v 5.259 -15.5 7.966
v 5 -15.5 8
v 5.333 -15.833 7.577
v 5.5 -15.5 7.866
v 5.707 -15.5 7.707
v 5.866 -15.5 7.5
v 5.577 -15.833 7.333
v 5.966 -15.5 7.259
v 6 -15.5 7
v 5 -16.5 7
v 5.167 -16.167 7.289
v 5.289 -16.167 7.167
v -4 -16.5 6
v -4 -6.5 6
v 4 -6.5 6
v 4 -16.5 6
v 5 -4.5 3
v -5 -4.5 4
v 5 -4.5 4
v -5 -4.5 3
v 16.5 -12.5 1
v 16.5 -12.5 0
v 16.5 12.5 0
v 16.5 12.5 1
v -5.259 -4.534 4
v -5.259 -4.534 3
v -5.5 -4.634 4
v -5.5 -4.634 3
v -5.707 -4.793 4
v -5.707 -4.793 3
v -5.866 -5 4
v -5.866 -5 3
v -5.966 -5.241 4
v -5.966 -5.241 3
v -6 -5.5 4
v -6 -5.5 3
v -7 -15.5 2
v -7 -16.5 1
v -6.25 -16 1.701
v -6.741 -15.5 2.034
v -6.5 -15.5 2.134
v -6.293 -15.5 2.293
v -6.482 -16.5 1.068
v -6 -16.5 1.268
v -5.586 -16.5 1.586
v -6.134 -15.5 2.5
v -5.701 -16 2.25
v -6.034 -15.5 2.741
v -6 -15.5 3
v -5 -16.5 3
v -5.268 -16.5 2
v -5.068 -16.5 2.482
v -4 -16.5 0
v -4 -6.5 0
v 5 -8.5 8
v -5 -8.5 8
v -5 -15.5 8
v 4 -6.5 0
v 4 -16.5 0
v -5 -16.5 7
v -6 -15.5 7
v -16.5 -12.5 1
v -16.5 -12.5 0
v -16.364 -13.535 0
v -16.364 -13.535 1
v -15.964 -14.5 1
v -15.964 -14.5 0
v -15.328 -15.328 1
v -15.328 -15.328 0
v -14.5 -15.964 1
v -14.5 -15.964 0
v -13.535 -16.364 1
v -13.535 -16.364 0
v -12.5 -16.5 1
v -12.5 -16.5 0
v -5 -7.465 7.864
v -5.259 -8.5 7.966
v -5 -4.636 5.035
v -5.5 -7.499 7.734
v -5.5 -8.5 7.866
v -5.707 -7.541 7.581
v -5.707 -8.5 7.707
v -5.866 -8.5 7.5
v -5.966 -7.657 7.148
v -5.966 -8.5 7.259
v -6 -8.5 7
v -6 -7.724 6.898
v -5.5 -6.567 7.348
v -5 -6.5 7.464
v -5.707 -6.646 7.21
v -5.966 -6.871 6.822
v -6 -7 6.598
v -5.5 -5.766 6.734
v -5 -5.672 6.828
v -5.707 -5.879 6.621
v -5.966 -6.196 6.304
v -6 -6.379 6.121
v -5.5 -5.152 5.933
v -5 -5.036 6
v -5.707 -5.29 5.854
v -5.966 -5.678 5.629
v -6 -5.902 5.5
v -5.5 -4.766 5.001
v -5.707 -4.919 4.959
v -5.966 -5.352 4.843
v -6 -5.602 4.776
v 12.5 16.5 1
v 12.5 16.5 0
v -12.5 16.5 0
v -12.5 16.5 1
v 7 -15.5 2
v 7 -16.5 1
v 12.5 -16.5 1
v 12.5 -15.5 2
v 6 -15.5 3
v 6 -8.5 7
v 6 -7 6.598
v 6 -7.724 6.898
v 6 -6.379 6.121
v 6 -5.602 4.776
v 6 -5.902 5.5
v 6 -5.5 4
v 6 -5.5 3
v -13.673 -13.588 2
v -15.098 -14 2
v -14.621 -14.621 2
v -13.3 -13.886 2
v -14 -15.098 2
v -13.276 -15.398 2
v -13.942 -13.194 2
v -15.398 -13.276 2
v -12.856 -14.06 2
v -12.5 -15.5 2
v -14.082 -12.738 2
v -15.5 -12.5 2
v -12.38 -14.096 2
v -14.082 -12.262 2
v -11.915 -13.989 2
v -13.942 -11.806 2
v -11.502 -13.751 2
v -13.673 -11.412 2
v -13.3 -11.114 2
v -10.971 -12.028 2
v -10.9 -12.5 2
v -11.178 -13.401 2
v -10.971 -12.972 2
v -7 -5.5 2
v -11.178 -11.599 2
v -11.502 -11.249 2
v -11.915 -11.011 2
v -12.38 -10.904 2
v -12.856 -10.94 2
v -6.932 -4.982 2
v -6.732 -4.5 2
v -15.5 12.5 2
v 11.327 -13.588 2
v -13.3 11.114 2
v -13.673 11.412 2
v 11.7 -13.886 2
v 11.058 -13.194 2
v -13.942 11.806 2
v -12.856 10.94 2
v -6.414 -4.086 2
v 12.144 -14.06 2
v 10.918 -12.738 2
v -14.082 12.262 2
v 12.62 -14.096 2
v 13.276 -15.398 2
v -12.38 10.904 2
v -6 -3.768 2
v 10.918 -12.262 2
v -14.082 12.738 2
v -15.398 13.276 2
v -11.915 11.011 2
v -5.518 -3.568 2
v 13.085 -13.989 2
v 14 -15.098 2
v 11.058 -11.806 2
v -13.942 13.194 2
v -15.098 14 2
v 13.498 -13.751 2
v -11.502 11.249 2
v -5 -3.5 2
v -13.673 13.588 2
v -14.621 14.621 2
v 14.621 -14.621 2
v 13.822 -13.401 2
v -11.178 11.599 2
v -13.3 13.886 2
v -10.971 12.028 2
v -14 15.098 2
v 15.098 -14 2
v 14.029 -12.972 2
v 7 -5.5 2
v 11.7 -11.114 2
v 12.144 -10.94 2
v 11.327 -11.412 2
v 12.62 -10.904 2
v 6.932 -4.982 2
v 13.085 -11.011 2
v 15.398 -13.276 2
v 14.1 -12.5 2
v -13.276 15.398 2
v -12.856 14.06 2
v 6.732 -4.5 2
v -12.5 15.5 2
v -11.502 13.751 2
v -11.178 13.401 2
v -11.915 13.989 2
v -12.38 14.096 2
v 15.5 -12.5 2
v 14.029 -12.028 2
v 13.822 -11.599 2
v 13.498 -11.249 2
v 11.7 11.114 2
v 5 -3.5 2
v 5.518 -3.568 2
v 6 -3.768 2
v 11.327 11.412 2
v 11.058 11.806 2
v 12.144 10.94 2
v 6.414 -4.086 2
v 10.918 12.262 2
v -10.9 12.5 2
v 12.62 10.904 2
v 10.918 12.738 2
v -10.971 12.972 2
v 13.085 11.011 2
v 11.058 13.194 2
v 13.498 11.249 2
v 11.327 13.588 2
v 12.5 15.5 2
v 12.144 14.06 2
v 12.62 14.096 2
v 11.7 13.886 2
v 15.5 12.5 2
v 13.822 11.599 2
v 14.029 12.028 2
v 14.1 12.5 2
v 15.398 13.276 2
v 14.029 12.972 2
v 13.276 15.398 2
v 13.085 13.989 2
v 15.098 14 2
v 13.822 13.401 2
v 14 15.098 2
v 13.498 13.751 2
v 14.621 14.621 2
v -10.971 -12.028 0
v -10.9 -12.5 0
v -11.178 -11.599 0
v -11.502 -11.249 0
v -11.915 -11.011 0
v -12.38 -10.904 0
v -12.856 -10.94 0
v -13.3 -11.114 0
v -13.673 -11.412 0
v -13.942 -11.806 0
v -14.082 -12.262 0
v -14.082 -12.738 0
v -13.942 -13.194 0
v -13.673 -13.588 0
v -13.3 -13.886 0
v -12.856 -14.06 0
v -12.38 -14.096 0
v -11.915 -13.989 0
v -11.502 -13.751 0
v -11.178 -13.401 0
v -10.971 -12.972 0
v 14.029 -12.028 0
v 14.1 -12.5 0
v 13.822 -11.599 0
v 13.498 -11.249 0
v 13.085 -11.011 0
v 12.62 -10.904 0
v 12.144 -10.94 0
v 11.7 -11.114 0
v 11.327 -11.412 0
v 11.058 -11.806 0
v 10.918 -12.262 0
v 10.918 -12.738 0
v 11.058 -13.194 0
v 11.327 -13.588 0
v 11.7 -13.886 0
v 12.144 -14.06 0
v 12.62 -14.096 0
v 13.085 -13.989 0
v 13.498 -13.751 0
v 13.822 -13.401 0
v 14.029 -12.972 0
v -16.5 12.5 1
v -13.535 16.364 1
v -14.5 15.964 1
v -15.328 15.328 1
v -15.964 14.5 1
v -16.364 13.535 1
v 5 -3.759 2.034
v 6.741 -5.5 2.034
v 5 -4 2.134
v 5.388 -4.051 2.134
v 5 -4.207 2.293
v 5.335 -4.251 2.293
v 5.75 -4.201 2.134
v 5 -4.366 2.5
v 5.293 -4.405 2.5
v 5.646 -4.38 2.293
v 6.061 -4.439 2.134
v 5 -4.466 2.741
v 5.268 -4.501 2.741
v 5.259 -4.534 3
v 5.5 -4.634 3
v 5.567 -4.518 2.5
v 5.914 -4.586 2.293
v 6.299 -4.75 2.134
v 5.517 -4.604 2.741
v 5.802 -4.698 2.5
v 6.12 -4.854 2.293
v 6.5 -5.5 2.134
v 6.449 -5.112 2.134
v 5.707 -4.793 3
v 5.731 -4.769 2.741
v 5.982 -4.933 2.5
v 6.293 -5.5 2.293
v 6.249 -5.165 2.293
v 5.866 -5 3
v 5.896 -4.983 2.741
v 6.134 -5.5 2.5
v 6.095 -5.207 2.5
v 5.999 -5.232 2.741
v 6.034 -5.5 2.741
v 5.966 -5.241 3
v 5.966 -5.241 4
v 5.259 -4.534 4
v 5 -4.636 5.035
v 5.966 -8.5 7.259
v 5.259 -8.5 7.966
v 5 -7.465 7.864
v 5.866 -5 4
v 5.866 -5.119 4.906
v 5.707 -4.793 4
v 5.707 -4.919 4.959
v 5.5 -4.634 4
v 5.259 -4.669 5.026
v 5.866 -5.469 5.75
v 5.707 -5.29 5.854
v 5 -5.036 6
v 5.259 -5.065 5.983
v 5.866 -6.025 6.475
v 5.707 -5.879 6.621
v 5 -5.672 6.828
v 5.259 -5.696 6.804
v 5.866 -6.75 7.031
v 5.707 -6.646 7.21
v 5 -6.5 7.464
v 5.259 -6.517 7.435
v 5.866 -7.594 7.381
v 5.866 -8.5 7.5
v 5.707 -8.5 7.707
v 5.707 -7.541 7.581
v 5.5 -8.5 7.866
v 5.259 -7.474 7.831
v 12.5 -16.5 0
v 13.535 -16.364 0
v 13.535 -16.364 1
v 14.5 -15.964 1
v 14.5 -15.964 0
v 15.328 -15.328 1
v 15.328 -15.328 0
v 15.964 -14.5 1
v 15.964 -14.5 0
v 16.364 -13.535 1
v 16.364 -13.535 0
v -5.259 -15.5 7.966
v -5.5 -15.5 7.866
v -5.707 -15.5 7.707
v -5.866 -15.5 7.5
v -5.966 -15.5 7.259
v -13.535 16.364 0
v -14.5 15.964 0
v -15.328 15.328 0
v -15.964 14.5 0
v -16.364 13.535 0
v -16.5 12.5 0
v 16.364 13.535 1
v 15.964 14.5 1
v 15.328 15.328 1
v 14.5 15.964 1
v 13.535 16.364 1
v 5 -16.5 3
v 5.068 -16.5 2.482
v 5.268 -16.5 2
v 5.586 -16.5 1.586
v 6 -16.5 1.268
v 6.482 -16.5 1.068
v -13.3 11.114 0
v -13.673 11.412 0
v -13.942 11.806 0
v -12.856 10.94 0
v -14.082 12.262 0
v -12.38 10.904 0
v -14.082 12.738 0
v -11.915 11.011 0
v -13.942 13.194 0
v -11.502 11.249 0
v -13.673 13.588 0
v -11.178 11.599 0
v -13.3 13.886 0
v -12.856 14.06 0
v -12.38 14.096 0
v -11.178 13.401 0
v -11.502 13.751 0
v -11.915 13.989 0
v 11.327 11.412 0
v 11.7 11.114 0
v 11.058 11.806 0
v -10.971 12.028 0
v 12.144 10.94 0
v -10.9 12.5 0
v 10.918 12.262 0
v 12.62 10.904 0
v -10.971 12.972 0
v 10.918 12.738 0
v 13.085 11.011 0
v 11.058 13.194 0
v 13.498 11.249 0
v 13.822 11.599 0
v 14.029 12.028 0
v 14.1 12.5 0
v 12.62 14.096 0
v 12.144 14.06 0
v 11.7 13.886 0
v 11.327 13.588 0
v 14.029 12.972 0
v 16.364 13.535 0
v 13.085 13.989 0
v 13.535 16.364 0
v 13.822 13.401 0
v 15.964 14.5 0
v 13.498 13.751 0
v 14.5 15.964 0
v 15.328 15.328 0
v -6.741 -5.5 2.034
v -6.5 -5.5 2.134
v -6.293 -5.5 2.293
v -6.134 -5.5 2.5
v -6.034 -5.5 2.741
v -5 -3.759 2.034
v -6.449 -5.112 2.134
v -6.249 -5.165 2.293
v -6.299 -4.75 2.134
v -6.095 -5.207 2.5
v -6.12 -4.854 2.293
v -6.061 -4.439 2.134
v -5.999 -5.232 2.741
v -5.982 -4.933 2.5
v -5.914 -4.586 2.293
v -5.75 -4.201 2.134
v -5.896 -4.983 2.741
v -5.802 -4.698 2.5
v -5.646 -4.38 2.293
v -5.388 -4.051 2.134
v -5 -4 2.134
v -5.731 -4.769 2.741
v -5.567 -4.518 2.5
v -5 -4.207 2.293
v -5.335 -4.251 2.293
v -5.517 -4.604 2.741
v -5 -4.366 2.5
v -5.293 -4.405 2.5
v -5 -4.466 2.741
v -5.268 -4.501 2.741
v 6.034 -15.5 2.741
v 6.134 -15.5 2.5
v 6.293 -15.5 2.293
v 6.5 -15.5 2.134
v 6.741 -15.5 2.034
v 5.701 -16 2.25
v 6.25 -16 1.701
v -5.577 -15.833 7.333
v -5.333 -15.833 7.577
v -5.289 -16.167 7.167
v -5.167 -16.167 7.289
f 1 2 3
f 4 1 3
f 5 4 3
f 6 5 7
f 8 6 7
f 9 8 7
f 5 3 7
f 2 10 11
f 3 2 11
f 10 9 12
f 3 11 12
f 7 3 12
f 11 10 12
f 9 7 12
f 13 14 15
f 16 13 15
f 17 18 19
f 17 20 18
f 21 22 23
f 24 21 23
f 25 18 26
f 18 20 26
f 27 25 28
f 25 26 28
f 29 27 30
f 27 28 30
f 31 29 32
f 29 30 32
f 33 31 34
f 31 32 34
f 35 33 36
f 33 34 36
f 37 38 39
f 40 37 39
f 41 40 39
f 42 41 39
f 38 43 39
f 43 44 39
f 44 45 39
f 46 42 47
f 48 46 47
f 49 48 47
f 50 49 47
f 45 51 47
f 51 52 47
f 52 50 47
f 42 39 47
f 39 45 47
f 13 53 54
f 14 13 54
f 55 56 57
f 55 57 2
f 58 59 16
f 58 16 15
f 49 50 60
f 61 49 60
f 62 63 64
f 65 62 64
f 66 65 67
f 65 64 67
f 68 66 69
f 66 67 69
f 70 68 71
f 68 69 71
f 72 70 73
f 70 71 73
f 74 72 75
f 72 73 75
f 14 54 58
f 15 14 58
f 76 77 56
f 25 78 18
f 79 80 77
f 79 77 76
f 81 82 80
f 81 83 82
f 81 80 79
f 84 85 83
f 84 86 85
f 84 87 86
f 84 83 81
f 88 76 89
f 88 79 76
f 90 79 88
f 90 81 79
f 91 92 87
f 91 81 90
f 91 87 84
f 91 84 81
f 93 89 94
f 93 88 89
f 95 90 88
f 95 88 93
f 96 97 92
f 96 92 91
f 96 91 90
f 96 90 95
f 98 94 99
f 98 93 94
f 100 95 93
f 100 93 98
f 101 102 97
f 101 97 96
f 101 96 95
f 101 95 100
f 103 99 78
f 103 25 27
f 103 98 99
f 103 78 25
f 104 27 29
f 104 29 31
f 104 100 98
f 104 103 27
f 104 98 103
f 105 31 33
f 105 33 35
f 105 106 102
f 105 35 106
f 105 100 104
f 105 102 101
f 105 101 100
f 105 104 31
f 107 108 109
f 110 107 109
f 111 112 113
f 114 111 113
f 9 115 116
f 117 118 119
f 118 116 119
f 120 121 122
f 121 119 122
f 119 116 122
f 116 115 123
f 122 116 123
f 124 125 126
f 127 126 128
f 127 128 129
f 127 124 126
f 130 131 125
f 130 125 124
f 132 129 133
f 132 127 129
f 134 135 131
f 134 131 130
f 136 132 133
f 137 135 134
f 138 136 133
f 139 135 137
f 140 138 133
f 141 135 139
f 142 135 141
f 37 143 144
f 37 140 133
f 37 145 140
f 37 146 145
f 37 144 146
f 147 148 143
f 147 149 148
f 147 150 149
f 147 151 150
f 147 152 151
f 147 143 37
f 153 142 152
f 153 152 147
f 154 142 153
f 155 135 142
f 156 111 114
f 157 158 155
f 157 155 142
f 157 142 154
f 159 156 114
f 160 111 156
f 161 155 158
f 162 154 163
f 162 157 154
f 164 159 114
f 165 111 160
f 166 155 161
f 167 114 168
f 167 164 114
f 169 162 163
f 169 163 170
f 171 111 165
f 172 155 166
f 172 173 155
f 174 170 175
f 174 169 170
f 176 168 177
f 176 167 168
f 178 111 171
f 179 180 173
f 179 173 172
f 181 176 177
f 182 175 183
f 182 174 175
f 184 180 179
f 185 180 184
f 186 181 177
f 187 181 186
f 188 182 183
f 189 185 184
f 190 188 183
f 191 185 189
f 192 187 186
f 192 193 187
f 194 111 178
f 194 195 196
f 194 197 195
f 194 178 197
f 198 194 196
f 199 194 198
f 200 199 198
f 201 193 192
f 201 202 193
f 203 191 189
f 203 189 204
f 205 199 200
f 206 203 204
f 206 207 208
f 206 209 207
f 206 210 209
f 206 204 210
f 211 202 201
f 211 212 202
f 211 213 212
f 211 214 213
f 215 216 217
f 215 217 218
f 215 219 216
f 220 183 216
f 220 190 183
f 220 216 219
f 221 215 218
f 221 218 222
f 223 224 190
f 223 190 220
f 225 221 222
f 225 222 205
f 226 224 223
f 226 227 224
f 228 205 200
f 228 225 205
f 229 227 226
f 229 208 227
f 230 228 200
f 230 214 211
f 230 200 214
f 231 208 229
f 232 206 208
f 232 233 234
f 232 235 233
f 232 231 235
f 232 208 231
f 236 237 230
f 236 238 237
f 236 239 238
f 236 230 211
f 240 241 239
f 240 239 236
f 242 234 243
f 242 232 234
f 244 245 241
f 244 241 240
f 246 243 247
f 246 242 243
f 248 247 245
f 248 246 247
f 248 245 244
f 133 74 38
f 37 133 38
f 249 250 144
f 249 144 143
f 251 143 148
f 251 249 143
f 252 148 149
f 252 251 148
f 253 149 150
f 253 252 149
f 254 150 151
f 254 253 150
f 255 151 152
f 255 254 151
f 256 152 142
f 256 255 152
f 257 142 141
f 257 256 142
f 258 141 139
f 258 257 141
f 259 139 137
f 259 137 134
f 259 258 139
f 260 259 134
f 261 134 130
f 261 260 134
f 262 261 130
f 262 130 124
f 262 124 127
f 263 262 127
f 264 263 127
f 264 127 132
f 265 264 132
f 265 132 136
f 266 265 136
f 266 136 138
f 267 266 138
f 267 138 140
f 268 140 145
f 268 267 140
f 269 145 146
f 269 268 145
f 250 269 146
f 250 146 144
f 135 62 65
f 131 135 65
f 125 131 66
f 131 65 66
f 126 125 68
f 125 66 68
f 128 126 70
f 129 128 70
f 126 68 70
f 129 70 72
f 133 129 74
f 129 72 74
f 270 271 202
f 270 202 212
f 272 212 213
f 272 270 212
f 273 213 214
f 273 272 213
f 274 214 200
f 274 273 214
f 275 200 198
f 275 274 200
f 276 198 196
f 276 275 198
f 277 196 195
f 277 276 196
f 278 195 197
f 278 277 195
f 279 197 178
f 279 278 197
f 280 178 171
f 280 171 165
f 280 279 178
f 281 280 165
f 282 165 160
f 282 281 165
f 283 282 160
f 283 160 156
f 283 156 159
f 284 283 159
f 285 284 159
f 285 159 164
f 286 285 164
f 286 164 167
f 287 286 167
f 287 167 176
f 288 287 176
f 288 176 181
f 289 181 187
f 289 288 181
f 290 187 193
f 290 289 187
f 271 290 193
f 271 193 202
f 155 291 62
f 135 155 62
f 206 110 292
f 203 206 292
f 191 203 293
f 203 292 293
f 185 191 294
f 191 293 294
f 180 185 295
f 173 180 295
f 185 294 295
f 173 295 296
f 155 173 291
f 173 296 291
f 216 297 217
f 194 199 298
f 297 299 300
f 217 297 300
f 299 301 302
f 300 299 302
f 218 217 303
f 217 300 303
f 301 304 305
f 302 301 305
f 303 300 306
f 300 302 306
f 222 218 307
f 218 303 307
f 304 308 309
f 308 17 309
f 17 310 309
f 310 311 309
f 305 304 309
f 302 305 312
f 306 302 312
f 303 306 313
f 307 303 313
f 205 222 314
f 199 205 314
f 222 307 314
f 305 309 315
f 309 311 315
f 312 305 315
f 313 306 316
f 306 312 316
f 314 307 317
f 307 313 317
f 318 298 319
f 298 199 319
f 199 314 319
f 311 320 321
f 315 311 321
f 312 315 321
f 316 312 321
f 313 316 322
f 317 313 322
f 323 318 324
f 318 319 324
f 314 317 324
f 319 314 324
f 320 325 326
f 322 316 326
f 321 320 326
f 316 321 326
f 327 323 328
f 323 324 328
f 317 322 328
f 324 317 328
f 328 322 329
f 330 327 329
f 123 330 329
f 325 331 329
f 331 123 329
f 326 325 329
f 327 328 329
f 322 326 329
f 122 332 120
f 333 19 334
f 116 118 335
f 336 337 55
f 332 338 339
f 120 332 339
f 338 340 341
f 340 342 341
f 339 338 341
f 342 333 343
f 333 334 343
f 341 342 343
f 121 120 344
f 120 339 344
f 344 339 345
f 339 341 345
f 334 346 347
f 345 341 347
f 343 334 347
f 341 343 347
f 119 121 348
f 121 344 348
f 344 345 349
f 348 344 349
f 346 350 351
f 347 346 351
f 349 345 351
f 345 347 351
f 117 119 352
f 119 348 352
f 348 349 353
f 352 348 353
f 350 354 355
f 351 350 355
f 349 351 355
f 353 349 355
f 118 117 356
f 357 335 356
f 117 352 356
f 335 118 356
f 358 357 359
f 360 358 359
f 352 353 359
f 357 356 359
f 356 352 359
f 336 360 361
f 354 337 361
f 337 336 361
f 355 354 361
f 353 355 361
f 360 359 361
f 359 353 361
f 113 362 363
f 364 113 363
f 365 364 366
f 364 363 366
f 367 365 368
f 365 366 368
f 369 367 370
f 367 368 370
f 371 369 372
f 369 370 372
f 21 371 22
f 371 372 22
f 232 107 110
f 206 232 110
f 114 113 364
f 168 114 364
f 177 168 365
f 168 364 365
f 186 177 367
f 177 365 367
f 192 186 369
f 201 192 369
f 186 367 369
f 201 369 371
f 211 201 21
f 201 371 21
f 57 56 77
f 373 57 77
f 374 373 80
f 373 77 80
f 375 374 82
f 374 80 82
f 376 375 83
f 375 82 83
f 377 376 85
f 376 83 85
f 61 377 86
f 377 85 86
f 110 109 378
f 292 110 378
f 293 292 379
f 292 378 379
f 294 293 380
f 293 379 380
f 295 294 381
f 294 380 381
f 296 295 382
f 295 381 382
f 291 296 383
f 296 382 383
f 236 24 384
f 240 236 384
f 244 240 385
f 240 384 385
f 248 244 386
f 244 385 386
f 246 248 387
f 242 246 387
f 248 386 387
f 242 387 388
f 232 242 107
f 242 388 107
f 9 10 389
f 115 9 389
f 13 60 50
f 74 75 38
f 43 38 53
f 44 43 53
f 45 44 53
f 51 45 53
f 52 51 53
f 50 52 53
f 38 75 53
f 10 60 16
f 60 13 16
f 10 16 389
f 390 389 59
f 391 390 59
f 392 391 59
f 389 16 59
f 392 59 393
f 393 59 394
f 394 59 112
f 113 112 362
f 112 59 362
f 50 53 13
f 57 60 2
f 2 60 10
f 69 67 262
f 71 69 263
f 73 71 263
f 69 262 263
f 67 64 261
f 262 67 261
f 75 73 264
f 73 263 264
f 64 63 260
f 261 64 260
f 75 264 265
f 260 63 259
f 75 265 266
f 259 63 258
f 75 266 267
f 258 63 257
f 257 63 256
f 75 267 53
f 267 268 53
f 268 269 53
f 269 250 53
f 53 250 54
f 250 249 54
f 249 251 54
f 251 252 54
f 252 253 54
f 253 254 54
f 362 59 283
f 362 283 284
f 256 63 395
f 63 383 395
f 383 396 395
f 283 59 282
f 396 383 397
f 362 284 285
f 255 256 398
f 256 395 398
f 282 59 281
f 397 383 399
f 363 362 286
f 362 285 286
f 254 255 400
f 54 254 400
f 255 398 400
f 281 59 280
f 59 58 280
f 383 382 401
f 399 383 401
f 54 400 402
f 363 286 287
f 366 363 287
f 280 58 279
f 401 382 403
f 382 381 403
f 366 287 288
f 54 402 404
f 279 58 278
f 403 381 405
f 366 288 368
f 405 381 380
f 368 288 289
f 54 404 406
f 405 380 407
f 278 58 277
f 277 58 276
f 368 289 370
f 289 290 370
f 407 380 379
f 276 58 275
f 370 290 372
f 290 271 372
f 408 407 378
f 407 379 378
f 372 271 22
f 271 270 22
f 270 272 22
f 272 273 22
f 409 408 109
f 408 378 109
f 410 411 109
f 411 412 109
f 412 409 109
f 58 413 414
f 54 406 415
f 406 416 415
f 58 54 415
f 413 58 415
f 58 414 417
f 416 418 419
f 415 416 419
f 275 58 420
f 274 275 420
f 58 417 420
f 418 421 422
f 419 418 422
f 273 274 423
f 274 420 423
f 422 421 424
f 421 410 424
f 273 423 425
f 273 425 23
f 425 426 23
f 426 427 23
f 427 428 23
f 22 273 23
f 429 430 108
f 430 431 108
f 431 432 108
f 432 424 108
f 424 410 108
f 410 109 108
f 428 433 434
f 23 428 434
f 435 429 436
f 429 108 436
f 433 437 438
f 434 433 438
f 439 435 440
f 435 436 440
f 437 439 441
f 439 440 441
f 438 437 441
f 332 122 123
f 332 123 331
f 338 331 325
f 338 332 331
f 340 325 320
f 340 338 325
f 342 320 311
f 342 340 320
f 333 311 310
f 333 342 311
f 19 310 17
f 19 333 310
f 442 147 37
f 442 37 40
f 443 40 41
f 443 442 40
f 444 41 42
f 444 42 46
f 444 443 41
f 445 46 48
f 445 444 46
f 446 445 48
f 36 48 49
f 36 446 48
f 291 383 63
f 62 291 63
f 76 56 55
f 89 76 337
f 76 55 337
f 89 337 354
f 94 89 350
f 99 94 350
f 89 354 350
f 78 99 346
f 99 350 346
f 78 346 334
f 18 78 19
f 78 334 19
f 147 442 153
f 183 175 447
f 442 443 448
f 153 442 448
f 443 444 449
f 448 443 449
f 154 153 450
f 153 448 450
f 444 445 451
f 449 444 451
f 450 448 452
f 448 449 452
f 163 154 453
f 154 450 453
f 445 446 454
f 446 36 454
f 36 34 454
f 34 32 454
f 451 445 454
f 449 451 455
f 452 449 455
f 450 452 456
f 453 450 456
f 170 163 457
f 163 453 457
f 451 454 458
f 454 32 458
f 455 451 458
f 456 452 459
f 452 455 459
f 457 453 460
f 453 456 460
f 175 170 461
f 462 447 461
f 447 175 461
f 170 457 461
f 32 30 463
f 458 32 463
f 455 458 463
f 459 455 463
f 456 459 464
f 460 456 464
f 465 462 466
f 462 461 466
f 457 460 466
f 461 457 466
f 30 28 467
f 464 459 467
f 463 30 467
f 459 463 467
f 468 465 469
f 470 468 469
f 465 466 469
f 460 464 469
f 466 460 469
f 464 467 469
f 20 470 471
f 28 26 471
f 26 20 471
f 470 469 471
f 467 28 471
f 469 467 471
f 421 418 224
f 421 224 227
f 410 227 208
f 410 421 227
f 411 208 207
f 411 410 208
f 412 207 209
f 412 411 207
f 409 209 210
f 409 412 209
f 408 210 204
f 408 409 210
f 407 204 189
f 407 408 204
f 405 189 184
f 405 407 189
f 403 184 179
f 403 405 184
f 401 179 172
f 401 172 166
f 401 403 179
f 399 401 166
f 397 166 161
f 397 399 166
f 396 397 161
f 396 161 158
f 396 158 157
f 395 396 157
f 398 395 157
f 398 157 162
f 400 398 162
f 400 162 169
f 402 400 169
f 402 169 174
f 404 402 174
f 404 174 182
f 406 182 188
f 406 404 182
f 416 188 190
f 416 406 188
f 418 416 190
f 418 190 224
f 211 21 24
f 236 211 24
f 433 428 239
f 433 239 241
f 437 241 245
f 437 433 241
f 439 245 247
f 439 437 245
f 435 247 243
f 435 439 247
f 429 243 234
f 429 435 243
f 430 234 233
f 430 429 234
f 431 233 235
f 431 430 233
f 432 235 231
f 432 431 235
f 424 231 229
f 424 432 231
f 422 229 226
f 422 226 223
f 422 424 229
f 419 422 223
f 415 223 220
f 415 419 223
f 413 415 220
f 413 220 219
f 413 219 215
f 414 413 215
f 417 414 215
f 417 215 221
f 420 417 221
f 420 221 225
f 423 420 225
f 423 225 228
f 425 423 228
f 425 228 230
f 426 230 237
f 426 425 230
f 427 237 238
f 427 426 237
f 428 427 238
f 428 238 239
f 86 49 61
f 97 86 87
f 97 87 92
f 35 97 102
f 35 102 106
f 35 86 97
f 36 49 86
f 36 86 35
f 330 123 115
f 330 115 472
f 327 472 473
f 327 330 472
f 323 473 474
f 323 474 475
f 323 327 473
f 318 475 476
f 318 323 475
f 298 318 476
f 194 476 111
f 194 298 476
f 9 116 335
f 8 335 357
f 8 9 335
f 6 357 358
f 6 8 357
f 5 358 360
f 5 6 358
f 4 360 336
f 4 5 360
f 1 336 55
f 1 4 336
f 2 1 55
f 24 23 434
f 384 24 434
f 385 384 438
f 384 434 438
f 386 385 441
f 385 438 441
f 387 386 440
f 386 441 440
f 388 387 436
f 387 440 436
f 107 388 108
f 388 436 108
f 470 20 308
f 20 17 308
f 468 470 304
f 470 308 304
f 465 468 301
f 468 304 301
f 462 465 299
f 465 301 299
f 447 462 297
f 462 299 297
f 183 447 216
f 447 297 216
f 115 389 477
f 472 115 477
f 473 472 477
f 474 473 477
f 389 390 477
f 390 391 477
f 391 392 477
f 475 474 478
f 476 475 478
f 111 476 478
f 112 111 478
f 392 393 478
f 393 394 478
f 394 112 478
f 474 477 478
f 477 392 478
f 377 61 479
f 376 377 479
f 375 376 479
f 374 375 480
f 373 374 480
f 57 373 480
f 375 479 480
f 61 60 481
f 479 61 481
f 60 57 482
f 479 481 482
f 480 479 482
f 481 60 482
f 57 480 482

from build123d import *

# Parameters (mm, degrees)
SKETCH1_R               = 1.6
BOSS_EXTRUDE1_DEPTH     = 2
SKETCH2_W               = 12
SKETCH2_H               = 12
BOSS_EXTRUDE2_DEPTH     = 6
CUT_EXTRUDE1_DEPTH      = 4
CUT_EXTRUDE1_DEPTH_BACK = 25.093567606
SKETCH2_3_W             = 8
SKETCH2_3_H             = 10
FILLET1_R               = 4
FILLET3_R               = 1
CHAMFER1_SIZE           = 1


with BuildPart() as part:
    # Sketch1 → Boss-Extrude1 (new body)
    with BuildSketch(Plane.XY):
        with BuildLine():
            Line((-12.5, -16.5), (12.5, -16.5))
            ThreePointArc((12.5, -16.5), (15.328427125, -15.328427125), (16.5, -12.5))
            Line((16.5, -12.5), (16.5, 12.5))
            ThreePointArc((16.5, 12.5), (15.328427125, 15.328427125), (12.5, 16.5))
            Line((12.5, 16.5), (-12.5, 16.5))
            ThreePointArc((-12.5, 16.5), (-15.328427125, 15.328427125), (-16.5, 12.5))
            Line((-16.5, 12.5), (-16.5, -12.5))
            ThreePointArc((-16.5, -12.5), (-15.328427125, -15.328427125), (-12.5, -16.5))
        make_face()
        with Locations((-12.5, -12.5)):
            Circle(SKETCH1_R, mode=Mode.SUBTRACT)
        with Locations((12.5, -12.5)):
            Circle(SKETCH1_R, mode=Mode.SUBTRACT)
        with Locations((12.5, 12.5)):
            Circle(SKETCH1_R, mode=Mode.SUBTRACT)
        with Locations((-12.5, 12.5)):
            Circle(SKETCH1_R, mode=Mode.SUBTRACT)
    extrude(amount=BOSS_EXTRUDE1_DEPTH)

    # Sketch2 → Boss-Extrude2 (add)
    with BuildSketch(Plane.XY.offset(2)):
        with Locations((0, -10.5)):
            Rectangle(SKETCH2_W, SKETCH2_H)
    extrude(amount=BOSS_EXTRUDE2_DEPTH)

    # Sketch2<3> → Cut-Extrude1 (cut, two sides: drawn at the far end of the back side and taken through both)
    with BuildSketch(Plane.XY.offset(2).offset(-CUT_EXTRUDE1_DEPTH_BACK)):
        with Locations((0, -11.5)):
            Rectangle(SKETCH2_3_W, SKETCH2_3_H)
    extrude(amount=CUT_EXTRUDE1_DEPTH + CUT_EXTRUDE1_DEPTH_BACK, mode=Mode.SUBTRACT)

    # Fillet1
    fillet1_edges = [part.edges().sort_by_distance(p)[0] for p in [
        (0, -4.5, 8),
    ]]
    fillet(fillet1_edges, radius=FILLET1_R)

    # Fillet3
    fillet3_edges = [part.edges().sort_by_distance(p)[0] for p in [
        (-6, -12.5, 8),
        (-6, -10.5, 2),
        (0, -4.5, 2),
        (6, -10.5, 2),
        (-6, -4.5, 3),
        (6, -4.5, 3),
        (6, -12.5, 8),
        (6, -5.671572875, 6.828427125),
        (-6, -5.671572875, 6.828427125),
    ]]
    fillet(fillet3_edges, radius=FILLET3_R)

    # Chamfer1
    chamfer1_edges = [part.edges().sort_by_distance(p)[0] for p in [
        (-15.328427125, -15.328427125, 2),
        (-9.75, -16.5, 2),
        (15.328427125, -15.328427125, 2),
        (16.5, 0, 2),
        (15.328427125, 15.328427125, 2),
        (0, 16.5, 2),
        (-15.328427125, 15.328427125, 2),
        (-6, -16.5, 5),
        (0, -16.5, 8),
        (9.75, -16.5, 2),
        (6, -16.5, 5),
        (5.707106781, -16.5, 7.707106781),
        (-5.707106781, -16.5, 7.707106781),
        (-16.5, 0, 2),
        (-6.292893219, -16.5, 2.292893219),
        (6.292893219, -16.5, 2.292893219),
    ]]
    chamfer(chamfer1_edges, length=CHAMFER1_SIZE)


solid = part.part
